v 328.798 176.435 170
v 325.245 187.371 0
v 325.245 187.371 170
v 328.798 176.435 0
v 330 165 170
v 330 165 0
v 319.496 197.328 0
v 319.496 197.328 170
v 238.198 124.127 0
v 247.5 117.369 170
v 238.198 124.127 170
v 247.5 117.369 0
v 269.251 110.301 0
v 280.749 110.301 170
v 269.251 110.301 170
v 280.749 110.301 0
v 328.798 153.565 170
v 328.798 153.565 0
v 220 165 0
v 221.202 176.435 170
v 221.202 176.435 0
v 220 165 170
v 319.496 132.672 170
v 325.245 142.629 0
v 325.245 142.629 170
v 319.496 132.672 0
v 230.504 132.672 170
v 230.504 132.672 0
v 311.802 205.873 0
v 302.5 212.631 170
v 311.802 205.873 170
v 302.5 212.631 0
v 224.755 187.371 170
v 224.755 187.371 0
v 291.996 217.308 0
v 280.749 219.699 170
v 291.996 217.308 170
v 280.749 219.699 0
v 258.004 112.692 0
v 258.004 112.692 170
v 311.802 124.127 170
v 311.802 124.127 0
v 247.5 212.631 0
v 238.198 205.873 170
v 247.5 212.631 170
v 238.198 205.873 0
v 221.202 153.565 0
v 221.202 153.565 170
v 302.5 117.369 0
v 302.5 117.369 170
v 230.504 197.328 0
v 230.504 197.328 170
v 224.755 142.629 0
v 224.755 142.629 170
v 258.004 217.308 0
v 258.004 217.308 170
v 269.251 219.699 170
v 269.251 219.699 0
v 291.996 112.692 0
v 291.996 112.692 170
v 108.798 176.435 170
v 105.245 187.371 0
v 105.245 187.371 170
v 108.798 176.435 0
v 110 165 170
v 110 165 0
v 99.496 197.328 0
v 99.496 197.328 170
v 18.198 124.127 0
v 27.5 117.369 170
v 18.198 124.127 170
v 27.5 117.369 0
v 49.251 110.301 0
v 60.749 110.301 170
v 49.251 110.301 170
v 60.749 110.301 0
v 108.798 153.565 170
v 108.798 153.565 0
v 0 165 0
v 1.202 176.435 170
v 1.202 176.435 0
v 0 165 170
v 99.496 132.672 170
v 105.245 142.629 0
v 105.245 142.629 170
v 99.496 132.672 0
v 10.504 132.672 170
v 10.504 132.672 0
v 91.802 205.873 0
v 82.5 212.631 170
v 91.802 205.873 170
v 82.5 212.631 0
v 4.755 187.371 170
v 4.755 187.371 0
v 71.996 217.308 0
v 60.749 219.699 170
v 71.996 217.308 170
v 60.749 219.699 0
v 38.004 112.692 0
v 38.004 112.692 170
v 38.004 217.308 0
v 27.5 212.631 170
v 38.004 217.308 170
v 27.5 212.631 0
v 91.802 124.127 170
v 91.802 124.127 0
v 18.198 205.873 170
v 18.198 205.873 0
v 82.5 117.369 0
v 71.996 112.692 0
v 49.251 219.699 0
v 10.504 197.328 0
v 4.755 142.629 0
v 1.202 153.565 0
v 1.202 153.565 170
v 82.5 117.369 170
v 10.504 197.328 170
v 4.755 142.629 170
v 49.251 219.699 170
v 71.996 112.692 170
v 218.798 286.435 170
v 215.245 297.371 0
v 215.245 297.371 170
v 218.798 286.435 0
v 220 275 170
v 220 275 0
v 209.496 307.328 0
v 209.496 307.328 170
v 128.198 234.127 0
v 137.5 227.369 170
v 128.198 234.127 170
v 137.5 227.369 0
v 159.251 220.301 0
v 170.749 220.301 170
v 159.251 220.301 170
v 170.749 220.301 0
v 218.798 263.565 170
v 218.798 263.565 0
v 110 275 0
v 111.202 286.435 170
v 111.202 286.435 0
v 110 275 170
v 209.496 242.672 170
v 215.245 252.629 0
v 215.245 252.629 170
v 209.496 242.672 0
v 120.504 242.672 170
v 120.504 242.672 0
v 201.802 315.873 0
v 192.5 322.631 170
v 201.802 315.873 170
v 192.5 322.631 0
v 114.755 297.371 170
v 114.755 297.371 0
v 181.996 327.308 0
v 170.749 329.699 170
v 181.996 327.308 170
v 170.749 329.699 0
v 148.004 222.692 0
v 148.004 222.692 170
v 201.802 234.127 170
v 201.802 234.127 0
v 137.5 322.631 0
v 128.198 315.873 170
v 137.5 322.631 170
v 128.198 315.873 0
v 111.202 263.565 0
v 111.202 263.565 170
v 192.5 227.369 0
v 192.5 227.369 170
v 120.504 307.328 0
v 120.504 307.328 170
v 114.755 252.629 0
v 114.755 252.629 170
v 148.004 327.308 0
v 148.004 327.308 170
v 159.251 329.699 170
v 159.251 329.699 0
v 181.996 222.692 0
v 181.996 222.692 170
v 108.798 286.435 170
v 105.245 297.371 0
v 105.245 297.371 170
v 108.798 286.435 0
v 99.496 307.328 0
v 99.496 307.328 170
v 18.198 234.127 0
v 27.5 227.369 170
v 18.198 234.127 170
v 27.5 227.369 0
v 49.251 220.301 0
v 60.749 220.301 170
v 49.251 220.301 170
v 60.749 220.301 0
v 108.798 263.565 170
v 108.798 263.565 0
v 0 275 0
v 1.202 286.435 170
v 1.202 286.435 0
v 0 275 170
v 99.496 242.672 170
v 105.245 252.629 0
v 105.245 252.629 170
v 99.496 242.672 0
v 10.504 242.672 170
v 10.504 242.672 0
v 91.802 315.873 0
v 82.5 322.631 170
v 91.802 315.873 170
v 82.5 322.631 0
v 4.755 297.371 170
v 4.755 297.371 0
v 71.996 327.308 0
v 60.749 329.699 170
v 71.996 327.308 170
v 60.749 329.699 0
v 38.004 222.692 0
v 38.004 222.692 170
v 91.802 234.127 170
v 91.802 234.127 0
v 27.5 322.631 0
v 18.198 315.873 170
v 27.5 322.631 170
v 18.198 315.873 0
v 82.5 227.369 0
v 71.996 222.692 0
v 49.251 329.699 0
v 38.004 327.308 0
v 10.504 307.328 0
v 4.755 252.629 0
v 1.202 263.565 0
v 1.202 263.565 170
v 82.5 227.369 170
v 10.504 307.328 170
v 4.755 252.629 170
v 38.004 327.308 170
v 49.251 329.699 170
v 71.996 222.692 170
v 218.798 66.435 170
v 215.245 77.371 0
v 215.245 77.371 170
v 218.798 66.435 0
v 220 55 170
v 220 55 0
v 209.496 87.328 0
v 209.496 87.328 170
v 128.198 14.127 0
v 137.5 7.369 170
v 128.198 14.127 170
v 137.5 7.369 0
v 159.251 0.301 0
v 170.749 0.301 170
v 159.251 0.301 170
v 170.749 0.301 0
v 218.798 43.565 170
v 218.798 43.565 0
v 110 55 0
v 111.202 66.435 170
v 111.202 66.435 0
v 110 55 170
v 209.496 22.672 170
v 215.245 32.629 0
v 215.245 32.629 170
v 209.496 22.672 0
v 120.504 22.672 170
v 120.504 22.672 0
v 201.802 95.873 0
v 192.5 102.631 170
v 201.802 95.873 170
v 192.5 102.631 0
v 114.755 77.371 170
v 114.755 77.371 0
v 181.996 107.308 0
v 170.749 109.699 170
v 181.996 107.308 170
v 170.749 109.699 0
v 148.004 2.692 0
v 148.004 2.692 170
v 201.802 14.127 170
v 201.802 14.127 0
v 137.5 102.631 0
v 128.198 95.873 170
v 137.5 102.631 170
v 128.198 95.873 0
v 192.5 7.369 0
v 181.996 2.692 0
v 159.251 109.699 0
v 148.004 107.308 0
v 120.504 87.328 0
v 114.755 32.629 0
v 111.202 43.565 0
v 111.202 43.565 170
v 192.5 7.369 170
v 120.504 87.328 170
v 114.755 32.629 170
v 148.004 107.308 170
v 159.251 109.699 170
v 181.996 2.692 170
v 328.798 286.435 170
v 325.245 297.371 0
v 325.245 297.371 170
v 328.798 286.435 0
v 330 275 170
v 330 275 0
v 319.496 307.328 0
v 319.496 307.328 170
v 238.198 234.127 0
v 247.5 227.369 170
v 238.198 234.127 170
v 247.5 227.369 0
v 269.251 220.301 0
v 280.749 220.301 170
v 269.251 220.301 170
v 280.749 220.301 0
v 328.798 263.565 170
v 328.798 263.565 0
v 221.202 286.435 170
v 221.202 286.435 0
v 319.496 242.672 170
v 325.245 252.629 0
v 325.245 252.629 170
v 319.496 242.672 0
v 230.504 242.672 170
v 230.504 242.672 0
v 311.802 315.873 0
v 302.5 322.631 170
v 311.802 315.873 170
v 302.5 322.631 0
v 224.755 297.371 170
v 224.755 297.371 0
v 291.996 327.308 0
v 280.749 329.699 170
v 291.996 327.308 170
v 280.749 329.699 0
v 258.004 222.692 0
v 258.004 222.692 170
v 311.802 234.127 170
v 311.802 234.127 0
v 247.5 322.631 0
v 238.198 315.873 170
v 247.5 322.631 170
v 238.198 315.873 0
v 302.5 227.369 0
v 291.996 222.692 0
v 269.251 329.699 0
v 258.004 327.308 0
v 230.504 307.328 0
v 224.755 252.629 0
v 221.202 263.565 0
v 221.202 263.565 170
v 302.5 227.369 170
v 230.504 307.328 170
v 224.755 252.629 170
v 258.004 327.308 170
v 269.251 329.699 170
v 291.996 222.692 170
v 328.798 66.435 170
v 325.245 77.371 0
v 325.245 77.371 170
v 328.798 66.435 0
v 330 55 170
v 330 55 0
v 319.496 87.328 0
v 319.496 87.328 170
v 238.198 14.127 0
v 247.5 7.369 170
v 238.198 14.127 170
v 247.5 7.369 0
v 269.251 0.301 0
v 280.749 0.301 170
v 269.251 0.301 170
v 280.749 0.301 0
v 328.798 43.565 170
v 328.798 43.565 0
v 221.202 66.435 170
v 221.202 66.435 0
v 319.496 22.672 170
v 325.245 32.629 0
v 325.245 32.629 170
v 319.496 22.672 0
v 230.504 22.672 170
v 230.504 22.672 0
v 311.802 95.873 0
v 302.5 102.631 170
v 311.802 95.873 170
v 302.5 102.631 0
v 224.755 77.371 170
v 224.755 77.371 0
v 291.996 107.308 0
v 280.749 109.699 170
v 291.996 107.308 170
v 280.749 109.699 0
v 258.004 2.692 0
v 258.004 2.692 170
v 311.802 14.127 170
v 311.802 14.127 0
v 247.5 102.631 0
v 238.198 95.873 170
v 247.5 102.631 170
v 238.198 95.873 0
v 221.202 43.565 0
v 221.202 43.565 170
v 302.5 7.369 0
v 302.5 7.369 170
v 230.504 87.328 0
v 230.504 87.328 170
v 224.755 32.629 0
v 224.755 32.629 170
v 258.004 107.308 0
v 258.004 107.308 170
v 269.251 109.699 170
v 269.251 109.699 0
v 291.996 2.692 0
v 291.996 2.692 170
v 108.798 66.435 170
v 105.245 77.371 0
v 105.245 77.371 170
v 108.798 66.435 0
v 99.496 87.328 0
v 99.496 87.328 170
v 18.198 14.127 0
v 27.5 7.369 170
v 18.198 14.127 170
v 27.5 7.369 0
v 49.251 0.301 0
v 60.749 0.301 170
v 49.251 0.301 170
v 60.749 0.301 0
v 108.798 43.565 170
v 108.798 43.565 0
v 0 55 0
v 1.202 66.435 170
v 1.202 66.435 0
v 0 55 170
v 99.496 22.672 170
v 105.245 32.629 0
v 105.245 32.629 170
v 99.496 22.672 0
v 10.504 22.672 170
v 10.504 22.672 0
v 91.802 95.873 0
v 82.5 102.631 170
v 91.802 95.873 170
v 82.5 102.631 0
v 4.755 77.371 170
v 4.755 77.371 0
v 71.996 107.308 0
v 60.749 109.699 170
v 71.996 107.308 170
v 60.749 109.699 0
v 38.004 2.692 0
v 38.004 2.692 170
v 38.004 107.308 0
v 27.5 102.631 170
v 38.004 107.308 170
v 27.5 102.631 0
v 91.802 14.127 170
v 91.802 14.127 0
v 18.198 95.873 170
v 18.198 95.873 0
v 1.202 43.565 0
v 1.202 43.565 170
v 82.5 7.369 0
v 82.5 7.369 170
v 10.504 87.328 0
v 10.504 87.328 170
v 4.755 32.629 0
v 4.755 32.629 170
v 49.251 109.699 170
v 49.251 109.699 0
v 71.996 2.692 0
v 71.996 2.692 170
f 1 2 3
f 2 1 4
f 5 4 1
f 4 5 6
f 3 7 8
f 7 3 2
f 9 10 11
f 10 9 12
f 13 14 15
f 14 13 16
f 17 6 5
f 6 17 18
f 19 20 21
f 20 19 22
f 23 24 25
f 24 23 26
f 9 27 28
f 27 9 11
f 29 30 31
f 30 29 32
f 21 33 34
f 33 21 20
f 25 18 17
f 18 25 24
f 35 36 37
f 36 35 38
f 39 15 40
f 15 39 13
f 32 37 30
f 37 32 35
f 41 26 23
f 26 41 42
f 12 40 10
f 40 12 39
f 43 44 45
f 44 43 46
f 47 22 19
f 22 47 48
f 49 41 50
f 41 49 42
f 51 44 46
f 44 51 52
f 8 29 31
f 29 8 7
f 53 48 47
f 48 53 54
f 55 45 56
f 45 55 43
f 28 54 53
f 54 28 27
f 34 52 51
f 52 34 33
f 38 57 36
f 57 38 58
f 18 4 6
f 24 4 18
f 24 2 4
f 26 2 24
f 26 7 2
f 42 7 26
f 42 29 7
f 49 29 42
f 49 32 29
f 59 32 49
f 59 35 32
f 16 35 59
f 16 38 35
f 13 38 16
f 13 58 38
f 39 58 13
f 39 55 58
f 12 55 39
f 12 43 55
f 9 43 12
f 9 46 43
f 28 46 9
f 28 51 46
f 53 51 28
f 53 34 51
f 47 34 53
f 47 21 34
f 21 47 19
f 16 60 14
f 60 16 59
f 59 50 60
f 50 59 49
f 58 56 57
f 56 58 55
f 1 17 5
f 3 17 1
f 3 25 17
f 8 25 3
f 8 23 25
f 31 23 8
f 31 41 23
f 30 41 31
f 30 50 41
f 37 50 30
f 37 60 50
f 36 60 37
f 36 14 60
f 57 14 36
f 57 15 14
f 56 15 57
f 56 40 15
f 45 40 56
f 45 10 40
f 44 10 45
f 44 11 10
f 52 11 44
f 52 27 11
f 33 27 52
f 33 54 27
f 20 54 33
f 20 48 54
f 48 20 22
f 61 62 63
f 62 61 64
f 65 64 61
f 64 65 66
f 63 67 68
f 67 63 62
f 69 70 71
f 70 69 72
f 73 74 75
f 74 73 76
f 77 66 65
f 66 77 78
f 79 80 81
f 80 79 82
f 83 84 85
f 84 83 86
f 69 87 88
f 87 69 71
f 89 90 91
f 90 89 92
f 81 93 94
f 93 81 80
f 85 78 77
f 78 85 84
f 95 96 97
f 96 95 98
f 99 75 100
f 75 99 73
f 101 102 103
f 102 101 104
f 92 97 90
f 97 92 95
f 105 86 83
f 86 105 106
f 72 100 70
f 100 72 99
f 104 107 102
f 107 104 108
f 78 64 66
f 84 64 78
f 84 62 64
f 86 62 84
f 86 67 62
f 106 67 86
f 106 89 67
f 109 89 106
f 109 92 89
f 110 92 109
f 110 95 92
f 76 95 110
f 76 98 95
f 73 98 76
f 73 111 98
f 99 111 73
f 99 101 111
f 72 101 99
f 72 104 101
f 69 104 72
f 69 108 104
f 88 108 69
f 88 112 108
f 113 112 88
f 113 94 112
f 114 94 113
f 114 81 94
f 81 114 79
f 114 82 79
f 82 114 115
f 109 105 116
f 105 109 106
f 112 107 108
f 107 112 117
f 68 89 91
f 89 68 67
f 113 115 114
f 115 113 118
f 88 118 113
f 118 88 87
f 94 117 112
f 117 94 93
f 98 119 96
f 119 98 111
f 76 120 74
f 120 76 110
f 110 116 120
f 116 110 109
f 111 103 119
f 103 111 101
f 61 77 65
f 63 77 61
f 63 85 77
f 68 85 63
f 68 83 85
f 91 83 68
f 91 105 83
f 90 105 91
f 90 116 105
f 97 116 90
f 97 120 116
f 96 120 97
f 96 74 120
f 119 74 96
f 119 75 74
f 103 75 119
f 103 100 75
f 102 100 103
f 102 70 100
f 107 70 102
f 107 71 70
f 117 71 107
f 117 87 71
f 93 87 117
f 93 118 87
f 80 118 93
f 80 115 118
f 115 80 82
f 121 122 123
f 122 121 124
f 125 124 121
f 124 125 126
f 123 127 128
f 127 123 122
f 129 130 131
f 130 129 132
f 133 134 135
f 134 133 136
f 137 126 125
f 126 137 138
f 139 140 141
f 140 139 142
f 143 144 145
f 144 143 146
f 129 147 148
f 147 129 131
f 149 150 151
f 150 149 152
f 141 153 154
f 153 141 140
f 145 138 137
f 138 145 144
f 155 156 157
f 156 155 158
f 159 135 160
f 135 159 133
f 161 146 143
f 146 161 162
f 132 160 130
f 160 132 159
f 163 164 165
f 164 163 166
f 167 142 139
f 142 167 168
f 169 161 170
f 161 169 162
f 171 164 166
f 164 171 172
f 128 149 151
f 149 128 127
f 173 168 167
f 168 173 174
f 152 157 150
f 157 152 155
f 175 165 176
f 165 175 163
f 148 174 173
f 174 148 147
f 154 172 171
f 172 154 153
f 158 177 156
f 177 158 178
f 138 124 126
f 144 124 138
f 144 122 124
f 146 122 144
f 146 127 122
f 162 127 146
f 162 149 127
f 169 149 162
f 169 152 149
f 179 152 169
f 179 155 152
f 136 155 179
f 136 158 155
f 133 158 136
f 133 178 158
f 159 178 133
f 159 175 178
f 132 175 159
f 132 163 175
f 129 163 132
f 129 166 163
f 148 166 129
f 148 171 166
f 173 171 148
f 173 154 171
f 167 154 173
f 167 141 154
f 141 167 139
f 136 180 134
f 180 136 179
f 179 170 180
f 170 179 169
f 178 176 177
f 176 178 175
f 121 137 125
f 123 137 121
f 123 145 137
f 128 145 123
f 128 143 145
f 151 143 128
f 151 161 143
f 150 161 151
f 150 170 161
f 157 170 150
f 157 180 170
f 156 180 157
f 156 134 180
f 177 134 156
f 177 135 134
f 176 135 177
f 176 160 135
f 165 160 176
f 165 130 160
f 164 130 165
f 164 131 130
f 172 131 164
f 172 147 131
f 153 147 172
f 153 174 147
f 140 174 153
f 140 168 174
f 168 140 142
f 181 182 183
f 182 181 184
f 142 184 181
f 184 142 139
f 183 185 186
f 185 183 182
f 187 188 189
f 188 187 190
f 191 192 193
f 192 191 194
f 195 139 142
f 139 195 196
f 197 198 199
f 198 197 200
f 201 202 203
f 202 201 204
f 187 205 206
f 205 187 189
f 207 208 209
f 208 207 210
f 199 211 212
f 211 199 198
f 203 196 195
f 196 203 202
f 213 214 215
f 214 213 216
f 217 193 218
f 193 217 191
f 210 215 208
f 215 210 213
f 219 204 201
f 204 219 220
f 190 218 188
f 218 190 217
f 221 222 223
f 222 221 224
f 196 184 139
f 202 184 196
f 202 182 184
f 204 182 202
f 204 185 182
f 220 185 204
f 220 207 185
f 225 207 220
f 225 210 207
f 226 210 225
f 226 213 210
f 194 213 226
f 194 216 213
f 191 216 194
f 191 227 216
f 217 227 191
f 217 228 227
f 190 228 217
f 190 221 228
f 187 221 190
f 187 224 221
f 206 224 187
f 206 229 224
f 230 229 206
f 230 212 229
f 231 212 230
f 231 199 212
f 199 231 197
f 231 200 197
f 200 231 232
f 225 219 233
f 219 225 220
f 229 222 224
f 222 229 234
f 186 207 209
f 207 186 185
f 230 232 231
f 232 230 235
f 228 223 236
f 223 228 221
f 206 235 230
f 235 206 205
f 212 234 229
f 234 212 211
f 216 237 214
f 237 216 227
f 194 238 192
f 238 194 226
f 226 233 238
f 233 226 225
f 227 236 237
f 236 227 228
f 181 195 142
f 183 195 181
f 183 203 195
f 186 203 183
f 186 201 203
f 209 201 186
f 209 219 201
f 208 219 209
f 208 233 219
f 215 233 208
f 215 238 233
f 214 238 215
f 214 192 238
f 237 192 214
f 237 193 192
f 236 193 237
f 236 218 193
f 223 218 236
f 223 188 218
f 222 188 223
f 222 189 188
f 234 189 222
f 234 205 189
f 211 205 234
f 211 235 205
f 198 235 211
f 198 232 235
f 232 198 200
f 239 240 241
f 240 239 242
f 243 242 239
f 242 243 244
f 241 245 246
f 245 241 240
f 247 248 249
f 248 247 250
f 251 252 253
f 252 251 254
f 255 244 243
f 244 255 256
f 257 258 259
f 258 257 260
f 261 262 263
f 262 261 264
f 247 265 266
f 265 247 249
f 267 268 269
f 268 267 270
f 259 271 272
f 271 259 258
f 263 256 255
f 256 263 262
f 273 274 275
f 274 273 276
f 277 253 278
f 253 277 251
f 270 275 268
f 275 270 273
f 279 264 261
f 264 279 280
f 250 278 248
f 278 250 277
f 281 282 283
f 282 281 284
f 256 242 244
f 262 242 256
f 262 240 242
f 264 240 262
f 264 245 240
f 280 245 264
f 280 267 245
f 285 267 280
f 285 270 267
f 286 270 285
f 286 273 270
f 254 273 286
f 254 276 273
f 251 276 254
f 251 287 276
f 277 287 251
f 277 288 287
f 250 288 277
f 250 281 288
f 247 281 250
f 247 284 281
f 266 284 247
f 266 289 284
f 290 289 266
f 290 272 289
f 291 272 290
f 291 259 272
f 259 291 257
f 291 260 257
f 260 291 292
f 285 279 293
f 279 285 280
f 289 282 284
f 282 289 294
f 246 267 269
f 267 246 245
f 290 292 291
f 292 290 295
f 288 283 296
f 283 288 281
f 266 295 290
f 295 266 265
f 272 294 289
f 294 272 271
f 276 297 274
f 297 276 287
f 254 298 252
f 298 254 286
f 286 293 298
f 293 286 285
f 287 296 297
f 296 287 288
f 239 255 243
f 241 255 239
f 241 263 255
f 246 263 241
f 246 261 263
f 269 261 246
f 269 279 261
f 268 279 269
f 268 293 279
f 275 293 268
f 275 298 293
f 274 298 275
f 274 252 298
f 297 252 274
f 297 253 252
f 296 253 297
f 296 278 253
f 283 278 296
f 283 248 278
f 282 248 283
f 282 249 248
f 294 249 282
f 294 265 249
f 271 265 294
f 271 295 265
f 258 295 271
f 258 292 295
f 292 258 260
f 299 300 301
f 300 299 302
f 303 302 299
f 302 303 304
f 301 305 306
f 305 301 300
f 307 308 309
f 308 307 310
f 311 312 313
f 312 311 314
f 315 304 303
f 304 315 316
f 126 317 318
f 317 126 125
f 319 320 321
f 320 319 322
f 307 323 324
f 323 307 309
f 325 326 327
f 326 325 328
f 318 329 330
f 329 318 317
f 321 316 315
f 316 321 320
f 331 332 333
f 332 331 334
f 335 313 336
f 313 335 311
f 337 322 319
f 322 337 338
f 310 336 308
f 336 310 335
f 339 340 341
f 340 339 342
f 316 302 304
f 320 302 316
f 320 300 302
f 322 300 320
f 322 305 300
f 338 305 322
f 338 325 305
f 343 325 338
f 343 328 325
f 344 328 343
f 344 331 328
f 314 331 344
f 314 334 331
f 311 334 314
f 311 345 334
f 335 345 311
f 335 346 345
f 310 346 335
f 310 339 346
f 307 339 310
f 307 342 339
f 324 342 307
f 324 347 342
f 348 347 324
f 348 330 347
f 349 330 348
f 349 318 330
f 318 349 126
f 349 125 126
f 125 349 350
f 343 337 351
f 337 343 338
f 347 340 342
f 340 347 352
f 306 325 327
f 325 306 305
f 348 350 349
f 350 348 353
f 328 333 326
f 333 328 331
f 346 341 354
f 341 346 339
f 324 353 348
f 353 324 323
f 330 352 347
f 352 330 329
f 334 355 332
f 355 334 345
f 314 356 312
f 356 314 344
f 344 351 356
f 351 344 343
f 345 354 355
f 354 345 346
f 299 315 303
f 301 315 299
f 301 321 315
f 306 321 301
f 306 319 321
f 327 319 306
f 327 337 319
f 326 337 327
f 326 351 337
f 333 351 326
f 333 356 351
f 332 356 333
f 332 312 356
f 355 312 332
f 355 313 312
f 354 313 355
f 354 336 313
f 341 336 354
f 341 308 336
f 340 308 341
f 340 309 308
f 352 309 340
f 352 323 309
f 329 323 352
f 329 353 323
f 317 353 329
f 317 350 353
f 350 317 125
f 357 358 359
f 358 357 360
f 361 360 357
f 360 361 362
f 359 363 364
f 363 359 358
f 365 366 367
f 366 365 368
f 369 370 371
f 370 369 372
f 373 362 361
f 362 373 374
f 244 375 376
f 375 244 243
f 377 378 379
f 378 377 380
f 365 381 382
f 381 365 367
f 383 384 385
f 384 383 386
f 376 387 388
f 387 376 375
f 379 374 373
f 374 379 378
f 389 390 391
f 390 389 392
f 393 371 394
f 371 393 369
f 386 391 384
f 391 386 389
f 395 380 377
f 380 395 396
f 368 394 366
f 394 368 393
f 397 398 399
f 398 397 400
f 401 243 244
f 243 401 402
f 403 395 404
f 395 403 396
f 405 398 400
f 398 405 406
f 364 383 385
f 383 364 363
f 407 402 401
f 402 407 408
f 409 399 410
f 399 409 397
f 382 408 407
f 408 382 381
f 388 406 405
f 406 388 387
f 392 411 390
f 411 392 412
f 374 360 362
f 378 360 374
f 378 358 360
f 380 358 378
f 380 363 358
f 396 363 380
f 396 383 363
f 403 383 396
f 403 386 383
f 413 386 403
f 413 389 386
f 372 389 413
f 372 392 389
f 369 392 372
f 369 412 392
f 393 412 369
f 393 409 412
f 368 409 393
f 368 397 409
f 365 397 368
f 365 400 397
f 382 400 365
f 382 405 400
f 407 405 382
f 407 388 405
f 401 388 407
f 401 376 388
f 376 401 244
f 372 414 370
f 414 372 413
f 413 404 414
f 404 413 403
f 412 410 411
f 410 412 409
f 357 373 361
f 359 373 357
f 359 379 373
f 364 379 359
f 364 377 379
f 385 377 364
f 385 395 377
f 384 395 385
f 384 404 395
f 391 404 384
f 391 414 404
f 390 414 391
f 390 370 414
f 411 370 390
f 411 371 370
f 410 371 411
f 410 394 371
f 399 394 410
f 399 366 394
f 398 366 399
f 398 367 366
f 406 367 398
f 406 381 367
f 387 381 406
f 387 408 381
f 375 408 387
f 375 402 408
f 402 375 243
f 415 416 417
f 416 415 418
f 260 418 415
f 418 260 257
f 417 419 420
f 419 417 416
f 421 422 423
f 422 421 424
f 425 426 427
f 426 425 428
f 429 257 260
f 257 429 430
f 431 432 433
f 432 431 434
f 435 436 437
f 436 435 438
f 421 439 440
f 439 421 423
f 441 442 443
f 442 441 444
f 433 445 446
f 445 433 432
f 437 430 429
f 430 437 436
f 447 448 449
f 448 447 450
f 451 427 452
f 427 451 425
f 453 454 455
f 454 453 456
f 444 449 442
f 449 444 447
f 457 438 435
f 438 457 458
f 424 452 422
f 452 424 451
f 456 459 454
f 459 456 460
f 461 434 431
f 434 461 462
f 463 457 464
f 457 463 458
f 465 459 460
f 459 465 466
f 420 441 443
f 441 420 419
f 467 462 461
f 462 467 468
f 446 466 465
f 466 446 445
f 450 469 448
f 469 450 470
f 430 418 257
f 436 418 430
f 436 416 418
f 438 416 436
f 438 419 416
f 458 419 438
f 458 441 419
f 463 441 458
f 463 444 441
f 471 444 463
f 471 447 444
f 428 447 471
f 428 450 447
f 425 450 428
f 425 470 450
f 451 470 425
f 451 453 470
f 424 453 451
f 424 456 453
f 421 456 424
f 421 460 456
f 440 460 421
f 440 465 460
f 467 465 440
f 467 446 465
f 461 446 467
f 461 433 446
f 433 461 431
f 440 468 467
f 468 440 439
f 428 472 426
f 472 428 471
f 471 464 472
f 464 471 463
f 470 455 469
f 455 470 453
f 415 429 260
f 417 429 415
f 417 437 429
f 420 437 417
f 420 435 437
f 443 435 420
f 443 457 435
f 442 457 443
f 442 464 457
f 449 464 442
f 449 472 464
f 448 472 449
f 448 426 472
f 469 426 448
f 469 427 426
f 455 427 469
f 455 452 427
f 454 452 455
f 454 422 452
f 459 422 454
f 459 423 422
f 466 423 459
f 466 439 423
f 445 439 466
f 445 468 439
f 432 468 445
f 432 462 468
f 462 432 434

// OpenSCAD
translate([275, 165, 0])
cylinder(h=170, r=55);

translate([55, 165, 0])
cylinder(h=170, r=55);

translate([165, 275, 0])
cylinder(h=170, r=55);

translate([55, 275, 0])
cylinder(h=170, r=55);

translate([165, 55, 0])
cylinder(h=170, r=55);

translate([275, 275, 0])
cylinder(h=170, r=55);

translate([275, 55, 0])
cylinder(h=170, r=55);

translate([55, 55, 0])
cylinder(h=170, r=55);
